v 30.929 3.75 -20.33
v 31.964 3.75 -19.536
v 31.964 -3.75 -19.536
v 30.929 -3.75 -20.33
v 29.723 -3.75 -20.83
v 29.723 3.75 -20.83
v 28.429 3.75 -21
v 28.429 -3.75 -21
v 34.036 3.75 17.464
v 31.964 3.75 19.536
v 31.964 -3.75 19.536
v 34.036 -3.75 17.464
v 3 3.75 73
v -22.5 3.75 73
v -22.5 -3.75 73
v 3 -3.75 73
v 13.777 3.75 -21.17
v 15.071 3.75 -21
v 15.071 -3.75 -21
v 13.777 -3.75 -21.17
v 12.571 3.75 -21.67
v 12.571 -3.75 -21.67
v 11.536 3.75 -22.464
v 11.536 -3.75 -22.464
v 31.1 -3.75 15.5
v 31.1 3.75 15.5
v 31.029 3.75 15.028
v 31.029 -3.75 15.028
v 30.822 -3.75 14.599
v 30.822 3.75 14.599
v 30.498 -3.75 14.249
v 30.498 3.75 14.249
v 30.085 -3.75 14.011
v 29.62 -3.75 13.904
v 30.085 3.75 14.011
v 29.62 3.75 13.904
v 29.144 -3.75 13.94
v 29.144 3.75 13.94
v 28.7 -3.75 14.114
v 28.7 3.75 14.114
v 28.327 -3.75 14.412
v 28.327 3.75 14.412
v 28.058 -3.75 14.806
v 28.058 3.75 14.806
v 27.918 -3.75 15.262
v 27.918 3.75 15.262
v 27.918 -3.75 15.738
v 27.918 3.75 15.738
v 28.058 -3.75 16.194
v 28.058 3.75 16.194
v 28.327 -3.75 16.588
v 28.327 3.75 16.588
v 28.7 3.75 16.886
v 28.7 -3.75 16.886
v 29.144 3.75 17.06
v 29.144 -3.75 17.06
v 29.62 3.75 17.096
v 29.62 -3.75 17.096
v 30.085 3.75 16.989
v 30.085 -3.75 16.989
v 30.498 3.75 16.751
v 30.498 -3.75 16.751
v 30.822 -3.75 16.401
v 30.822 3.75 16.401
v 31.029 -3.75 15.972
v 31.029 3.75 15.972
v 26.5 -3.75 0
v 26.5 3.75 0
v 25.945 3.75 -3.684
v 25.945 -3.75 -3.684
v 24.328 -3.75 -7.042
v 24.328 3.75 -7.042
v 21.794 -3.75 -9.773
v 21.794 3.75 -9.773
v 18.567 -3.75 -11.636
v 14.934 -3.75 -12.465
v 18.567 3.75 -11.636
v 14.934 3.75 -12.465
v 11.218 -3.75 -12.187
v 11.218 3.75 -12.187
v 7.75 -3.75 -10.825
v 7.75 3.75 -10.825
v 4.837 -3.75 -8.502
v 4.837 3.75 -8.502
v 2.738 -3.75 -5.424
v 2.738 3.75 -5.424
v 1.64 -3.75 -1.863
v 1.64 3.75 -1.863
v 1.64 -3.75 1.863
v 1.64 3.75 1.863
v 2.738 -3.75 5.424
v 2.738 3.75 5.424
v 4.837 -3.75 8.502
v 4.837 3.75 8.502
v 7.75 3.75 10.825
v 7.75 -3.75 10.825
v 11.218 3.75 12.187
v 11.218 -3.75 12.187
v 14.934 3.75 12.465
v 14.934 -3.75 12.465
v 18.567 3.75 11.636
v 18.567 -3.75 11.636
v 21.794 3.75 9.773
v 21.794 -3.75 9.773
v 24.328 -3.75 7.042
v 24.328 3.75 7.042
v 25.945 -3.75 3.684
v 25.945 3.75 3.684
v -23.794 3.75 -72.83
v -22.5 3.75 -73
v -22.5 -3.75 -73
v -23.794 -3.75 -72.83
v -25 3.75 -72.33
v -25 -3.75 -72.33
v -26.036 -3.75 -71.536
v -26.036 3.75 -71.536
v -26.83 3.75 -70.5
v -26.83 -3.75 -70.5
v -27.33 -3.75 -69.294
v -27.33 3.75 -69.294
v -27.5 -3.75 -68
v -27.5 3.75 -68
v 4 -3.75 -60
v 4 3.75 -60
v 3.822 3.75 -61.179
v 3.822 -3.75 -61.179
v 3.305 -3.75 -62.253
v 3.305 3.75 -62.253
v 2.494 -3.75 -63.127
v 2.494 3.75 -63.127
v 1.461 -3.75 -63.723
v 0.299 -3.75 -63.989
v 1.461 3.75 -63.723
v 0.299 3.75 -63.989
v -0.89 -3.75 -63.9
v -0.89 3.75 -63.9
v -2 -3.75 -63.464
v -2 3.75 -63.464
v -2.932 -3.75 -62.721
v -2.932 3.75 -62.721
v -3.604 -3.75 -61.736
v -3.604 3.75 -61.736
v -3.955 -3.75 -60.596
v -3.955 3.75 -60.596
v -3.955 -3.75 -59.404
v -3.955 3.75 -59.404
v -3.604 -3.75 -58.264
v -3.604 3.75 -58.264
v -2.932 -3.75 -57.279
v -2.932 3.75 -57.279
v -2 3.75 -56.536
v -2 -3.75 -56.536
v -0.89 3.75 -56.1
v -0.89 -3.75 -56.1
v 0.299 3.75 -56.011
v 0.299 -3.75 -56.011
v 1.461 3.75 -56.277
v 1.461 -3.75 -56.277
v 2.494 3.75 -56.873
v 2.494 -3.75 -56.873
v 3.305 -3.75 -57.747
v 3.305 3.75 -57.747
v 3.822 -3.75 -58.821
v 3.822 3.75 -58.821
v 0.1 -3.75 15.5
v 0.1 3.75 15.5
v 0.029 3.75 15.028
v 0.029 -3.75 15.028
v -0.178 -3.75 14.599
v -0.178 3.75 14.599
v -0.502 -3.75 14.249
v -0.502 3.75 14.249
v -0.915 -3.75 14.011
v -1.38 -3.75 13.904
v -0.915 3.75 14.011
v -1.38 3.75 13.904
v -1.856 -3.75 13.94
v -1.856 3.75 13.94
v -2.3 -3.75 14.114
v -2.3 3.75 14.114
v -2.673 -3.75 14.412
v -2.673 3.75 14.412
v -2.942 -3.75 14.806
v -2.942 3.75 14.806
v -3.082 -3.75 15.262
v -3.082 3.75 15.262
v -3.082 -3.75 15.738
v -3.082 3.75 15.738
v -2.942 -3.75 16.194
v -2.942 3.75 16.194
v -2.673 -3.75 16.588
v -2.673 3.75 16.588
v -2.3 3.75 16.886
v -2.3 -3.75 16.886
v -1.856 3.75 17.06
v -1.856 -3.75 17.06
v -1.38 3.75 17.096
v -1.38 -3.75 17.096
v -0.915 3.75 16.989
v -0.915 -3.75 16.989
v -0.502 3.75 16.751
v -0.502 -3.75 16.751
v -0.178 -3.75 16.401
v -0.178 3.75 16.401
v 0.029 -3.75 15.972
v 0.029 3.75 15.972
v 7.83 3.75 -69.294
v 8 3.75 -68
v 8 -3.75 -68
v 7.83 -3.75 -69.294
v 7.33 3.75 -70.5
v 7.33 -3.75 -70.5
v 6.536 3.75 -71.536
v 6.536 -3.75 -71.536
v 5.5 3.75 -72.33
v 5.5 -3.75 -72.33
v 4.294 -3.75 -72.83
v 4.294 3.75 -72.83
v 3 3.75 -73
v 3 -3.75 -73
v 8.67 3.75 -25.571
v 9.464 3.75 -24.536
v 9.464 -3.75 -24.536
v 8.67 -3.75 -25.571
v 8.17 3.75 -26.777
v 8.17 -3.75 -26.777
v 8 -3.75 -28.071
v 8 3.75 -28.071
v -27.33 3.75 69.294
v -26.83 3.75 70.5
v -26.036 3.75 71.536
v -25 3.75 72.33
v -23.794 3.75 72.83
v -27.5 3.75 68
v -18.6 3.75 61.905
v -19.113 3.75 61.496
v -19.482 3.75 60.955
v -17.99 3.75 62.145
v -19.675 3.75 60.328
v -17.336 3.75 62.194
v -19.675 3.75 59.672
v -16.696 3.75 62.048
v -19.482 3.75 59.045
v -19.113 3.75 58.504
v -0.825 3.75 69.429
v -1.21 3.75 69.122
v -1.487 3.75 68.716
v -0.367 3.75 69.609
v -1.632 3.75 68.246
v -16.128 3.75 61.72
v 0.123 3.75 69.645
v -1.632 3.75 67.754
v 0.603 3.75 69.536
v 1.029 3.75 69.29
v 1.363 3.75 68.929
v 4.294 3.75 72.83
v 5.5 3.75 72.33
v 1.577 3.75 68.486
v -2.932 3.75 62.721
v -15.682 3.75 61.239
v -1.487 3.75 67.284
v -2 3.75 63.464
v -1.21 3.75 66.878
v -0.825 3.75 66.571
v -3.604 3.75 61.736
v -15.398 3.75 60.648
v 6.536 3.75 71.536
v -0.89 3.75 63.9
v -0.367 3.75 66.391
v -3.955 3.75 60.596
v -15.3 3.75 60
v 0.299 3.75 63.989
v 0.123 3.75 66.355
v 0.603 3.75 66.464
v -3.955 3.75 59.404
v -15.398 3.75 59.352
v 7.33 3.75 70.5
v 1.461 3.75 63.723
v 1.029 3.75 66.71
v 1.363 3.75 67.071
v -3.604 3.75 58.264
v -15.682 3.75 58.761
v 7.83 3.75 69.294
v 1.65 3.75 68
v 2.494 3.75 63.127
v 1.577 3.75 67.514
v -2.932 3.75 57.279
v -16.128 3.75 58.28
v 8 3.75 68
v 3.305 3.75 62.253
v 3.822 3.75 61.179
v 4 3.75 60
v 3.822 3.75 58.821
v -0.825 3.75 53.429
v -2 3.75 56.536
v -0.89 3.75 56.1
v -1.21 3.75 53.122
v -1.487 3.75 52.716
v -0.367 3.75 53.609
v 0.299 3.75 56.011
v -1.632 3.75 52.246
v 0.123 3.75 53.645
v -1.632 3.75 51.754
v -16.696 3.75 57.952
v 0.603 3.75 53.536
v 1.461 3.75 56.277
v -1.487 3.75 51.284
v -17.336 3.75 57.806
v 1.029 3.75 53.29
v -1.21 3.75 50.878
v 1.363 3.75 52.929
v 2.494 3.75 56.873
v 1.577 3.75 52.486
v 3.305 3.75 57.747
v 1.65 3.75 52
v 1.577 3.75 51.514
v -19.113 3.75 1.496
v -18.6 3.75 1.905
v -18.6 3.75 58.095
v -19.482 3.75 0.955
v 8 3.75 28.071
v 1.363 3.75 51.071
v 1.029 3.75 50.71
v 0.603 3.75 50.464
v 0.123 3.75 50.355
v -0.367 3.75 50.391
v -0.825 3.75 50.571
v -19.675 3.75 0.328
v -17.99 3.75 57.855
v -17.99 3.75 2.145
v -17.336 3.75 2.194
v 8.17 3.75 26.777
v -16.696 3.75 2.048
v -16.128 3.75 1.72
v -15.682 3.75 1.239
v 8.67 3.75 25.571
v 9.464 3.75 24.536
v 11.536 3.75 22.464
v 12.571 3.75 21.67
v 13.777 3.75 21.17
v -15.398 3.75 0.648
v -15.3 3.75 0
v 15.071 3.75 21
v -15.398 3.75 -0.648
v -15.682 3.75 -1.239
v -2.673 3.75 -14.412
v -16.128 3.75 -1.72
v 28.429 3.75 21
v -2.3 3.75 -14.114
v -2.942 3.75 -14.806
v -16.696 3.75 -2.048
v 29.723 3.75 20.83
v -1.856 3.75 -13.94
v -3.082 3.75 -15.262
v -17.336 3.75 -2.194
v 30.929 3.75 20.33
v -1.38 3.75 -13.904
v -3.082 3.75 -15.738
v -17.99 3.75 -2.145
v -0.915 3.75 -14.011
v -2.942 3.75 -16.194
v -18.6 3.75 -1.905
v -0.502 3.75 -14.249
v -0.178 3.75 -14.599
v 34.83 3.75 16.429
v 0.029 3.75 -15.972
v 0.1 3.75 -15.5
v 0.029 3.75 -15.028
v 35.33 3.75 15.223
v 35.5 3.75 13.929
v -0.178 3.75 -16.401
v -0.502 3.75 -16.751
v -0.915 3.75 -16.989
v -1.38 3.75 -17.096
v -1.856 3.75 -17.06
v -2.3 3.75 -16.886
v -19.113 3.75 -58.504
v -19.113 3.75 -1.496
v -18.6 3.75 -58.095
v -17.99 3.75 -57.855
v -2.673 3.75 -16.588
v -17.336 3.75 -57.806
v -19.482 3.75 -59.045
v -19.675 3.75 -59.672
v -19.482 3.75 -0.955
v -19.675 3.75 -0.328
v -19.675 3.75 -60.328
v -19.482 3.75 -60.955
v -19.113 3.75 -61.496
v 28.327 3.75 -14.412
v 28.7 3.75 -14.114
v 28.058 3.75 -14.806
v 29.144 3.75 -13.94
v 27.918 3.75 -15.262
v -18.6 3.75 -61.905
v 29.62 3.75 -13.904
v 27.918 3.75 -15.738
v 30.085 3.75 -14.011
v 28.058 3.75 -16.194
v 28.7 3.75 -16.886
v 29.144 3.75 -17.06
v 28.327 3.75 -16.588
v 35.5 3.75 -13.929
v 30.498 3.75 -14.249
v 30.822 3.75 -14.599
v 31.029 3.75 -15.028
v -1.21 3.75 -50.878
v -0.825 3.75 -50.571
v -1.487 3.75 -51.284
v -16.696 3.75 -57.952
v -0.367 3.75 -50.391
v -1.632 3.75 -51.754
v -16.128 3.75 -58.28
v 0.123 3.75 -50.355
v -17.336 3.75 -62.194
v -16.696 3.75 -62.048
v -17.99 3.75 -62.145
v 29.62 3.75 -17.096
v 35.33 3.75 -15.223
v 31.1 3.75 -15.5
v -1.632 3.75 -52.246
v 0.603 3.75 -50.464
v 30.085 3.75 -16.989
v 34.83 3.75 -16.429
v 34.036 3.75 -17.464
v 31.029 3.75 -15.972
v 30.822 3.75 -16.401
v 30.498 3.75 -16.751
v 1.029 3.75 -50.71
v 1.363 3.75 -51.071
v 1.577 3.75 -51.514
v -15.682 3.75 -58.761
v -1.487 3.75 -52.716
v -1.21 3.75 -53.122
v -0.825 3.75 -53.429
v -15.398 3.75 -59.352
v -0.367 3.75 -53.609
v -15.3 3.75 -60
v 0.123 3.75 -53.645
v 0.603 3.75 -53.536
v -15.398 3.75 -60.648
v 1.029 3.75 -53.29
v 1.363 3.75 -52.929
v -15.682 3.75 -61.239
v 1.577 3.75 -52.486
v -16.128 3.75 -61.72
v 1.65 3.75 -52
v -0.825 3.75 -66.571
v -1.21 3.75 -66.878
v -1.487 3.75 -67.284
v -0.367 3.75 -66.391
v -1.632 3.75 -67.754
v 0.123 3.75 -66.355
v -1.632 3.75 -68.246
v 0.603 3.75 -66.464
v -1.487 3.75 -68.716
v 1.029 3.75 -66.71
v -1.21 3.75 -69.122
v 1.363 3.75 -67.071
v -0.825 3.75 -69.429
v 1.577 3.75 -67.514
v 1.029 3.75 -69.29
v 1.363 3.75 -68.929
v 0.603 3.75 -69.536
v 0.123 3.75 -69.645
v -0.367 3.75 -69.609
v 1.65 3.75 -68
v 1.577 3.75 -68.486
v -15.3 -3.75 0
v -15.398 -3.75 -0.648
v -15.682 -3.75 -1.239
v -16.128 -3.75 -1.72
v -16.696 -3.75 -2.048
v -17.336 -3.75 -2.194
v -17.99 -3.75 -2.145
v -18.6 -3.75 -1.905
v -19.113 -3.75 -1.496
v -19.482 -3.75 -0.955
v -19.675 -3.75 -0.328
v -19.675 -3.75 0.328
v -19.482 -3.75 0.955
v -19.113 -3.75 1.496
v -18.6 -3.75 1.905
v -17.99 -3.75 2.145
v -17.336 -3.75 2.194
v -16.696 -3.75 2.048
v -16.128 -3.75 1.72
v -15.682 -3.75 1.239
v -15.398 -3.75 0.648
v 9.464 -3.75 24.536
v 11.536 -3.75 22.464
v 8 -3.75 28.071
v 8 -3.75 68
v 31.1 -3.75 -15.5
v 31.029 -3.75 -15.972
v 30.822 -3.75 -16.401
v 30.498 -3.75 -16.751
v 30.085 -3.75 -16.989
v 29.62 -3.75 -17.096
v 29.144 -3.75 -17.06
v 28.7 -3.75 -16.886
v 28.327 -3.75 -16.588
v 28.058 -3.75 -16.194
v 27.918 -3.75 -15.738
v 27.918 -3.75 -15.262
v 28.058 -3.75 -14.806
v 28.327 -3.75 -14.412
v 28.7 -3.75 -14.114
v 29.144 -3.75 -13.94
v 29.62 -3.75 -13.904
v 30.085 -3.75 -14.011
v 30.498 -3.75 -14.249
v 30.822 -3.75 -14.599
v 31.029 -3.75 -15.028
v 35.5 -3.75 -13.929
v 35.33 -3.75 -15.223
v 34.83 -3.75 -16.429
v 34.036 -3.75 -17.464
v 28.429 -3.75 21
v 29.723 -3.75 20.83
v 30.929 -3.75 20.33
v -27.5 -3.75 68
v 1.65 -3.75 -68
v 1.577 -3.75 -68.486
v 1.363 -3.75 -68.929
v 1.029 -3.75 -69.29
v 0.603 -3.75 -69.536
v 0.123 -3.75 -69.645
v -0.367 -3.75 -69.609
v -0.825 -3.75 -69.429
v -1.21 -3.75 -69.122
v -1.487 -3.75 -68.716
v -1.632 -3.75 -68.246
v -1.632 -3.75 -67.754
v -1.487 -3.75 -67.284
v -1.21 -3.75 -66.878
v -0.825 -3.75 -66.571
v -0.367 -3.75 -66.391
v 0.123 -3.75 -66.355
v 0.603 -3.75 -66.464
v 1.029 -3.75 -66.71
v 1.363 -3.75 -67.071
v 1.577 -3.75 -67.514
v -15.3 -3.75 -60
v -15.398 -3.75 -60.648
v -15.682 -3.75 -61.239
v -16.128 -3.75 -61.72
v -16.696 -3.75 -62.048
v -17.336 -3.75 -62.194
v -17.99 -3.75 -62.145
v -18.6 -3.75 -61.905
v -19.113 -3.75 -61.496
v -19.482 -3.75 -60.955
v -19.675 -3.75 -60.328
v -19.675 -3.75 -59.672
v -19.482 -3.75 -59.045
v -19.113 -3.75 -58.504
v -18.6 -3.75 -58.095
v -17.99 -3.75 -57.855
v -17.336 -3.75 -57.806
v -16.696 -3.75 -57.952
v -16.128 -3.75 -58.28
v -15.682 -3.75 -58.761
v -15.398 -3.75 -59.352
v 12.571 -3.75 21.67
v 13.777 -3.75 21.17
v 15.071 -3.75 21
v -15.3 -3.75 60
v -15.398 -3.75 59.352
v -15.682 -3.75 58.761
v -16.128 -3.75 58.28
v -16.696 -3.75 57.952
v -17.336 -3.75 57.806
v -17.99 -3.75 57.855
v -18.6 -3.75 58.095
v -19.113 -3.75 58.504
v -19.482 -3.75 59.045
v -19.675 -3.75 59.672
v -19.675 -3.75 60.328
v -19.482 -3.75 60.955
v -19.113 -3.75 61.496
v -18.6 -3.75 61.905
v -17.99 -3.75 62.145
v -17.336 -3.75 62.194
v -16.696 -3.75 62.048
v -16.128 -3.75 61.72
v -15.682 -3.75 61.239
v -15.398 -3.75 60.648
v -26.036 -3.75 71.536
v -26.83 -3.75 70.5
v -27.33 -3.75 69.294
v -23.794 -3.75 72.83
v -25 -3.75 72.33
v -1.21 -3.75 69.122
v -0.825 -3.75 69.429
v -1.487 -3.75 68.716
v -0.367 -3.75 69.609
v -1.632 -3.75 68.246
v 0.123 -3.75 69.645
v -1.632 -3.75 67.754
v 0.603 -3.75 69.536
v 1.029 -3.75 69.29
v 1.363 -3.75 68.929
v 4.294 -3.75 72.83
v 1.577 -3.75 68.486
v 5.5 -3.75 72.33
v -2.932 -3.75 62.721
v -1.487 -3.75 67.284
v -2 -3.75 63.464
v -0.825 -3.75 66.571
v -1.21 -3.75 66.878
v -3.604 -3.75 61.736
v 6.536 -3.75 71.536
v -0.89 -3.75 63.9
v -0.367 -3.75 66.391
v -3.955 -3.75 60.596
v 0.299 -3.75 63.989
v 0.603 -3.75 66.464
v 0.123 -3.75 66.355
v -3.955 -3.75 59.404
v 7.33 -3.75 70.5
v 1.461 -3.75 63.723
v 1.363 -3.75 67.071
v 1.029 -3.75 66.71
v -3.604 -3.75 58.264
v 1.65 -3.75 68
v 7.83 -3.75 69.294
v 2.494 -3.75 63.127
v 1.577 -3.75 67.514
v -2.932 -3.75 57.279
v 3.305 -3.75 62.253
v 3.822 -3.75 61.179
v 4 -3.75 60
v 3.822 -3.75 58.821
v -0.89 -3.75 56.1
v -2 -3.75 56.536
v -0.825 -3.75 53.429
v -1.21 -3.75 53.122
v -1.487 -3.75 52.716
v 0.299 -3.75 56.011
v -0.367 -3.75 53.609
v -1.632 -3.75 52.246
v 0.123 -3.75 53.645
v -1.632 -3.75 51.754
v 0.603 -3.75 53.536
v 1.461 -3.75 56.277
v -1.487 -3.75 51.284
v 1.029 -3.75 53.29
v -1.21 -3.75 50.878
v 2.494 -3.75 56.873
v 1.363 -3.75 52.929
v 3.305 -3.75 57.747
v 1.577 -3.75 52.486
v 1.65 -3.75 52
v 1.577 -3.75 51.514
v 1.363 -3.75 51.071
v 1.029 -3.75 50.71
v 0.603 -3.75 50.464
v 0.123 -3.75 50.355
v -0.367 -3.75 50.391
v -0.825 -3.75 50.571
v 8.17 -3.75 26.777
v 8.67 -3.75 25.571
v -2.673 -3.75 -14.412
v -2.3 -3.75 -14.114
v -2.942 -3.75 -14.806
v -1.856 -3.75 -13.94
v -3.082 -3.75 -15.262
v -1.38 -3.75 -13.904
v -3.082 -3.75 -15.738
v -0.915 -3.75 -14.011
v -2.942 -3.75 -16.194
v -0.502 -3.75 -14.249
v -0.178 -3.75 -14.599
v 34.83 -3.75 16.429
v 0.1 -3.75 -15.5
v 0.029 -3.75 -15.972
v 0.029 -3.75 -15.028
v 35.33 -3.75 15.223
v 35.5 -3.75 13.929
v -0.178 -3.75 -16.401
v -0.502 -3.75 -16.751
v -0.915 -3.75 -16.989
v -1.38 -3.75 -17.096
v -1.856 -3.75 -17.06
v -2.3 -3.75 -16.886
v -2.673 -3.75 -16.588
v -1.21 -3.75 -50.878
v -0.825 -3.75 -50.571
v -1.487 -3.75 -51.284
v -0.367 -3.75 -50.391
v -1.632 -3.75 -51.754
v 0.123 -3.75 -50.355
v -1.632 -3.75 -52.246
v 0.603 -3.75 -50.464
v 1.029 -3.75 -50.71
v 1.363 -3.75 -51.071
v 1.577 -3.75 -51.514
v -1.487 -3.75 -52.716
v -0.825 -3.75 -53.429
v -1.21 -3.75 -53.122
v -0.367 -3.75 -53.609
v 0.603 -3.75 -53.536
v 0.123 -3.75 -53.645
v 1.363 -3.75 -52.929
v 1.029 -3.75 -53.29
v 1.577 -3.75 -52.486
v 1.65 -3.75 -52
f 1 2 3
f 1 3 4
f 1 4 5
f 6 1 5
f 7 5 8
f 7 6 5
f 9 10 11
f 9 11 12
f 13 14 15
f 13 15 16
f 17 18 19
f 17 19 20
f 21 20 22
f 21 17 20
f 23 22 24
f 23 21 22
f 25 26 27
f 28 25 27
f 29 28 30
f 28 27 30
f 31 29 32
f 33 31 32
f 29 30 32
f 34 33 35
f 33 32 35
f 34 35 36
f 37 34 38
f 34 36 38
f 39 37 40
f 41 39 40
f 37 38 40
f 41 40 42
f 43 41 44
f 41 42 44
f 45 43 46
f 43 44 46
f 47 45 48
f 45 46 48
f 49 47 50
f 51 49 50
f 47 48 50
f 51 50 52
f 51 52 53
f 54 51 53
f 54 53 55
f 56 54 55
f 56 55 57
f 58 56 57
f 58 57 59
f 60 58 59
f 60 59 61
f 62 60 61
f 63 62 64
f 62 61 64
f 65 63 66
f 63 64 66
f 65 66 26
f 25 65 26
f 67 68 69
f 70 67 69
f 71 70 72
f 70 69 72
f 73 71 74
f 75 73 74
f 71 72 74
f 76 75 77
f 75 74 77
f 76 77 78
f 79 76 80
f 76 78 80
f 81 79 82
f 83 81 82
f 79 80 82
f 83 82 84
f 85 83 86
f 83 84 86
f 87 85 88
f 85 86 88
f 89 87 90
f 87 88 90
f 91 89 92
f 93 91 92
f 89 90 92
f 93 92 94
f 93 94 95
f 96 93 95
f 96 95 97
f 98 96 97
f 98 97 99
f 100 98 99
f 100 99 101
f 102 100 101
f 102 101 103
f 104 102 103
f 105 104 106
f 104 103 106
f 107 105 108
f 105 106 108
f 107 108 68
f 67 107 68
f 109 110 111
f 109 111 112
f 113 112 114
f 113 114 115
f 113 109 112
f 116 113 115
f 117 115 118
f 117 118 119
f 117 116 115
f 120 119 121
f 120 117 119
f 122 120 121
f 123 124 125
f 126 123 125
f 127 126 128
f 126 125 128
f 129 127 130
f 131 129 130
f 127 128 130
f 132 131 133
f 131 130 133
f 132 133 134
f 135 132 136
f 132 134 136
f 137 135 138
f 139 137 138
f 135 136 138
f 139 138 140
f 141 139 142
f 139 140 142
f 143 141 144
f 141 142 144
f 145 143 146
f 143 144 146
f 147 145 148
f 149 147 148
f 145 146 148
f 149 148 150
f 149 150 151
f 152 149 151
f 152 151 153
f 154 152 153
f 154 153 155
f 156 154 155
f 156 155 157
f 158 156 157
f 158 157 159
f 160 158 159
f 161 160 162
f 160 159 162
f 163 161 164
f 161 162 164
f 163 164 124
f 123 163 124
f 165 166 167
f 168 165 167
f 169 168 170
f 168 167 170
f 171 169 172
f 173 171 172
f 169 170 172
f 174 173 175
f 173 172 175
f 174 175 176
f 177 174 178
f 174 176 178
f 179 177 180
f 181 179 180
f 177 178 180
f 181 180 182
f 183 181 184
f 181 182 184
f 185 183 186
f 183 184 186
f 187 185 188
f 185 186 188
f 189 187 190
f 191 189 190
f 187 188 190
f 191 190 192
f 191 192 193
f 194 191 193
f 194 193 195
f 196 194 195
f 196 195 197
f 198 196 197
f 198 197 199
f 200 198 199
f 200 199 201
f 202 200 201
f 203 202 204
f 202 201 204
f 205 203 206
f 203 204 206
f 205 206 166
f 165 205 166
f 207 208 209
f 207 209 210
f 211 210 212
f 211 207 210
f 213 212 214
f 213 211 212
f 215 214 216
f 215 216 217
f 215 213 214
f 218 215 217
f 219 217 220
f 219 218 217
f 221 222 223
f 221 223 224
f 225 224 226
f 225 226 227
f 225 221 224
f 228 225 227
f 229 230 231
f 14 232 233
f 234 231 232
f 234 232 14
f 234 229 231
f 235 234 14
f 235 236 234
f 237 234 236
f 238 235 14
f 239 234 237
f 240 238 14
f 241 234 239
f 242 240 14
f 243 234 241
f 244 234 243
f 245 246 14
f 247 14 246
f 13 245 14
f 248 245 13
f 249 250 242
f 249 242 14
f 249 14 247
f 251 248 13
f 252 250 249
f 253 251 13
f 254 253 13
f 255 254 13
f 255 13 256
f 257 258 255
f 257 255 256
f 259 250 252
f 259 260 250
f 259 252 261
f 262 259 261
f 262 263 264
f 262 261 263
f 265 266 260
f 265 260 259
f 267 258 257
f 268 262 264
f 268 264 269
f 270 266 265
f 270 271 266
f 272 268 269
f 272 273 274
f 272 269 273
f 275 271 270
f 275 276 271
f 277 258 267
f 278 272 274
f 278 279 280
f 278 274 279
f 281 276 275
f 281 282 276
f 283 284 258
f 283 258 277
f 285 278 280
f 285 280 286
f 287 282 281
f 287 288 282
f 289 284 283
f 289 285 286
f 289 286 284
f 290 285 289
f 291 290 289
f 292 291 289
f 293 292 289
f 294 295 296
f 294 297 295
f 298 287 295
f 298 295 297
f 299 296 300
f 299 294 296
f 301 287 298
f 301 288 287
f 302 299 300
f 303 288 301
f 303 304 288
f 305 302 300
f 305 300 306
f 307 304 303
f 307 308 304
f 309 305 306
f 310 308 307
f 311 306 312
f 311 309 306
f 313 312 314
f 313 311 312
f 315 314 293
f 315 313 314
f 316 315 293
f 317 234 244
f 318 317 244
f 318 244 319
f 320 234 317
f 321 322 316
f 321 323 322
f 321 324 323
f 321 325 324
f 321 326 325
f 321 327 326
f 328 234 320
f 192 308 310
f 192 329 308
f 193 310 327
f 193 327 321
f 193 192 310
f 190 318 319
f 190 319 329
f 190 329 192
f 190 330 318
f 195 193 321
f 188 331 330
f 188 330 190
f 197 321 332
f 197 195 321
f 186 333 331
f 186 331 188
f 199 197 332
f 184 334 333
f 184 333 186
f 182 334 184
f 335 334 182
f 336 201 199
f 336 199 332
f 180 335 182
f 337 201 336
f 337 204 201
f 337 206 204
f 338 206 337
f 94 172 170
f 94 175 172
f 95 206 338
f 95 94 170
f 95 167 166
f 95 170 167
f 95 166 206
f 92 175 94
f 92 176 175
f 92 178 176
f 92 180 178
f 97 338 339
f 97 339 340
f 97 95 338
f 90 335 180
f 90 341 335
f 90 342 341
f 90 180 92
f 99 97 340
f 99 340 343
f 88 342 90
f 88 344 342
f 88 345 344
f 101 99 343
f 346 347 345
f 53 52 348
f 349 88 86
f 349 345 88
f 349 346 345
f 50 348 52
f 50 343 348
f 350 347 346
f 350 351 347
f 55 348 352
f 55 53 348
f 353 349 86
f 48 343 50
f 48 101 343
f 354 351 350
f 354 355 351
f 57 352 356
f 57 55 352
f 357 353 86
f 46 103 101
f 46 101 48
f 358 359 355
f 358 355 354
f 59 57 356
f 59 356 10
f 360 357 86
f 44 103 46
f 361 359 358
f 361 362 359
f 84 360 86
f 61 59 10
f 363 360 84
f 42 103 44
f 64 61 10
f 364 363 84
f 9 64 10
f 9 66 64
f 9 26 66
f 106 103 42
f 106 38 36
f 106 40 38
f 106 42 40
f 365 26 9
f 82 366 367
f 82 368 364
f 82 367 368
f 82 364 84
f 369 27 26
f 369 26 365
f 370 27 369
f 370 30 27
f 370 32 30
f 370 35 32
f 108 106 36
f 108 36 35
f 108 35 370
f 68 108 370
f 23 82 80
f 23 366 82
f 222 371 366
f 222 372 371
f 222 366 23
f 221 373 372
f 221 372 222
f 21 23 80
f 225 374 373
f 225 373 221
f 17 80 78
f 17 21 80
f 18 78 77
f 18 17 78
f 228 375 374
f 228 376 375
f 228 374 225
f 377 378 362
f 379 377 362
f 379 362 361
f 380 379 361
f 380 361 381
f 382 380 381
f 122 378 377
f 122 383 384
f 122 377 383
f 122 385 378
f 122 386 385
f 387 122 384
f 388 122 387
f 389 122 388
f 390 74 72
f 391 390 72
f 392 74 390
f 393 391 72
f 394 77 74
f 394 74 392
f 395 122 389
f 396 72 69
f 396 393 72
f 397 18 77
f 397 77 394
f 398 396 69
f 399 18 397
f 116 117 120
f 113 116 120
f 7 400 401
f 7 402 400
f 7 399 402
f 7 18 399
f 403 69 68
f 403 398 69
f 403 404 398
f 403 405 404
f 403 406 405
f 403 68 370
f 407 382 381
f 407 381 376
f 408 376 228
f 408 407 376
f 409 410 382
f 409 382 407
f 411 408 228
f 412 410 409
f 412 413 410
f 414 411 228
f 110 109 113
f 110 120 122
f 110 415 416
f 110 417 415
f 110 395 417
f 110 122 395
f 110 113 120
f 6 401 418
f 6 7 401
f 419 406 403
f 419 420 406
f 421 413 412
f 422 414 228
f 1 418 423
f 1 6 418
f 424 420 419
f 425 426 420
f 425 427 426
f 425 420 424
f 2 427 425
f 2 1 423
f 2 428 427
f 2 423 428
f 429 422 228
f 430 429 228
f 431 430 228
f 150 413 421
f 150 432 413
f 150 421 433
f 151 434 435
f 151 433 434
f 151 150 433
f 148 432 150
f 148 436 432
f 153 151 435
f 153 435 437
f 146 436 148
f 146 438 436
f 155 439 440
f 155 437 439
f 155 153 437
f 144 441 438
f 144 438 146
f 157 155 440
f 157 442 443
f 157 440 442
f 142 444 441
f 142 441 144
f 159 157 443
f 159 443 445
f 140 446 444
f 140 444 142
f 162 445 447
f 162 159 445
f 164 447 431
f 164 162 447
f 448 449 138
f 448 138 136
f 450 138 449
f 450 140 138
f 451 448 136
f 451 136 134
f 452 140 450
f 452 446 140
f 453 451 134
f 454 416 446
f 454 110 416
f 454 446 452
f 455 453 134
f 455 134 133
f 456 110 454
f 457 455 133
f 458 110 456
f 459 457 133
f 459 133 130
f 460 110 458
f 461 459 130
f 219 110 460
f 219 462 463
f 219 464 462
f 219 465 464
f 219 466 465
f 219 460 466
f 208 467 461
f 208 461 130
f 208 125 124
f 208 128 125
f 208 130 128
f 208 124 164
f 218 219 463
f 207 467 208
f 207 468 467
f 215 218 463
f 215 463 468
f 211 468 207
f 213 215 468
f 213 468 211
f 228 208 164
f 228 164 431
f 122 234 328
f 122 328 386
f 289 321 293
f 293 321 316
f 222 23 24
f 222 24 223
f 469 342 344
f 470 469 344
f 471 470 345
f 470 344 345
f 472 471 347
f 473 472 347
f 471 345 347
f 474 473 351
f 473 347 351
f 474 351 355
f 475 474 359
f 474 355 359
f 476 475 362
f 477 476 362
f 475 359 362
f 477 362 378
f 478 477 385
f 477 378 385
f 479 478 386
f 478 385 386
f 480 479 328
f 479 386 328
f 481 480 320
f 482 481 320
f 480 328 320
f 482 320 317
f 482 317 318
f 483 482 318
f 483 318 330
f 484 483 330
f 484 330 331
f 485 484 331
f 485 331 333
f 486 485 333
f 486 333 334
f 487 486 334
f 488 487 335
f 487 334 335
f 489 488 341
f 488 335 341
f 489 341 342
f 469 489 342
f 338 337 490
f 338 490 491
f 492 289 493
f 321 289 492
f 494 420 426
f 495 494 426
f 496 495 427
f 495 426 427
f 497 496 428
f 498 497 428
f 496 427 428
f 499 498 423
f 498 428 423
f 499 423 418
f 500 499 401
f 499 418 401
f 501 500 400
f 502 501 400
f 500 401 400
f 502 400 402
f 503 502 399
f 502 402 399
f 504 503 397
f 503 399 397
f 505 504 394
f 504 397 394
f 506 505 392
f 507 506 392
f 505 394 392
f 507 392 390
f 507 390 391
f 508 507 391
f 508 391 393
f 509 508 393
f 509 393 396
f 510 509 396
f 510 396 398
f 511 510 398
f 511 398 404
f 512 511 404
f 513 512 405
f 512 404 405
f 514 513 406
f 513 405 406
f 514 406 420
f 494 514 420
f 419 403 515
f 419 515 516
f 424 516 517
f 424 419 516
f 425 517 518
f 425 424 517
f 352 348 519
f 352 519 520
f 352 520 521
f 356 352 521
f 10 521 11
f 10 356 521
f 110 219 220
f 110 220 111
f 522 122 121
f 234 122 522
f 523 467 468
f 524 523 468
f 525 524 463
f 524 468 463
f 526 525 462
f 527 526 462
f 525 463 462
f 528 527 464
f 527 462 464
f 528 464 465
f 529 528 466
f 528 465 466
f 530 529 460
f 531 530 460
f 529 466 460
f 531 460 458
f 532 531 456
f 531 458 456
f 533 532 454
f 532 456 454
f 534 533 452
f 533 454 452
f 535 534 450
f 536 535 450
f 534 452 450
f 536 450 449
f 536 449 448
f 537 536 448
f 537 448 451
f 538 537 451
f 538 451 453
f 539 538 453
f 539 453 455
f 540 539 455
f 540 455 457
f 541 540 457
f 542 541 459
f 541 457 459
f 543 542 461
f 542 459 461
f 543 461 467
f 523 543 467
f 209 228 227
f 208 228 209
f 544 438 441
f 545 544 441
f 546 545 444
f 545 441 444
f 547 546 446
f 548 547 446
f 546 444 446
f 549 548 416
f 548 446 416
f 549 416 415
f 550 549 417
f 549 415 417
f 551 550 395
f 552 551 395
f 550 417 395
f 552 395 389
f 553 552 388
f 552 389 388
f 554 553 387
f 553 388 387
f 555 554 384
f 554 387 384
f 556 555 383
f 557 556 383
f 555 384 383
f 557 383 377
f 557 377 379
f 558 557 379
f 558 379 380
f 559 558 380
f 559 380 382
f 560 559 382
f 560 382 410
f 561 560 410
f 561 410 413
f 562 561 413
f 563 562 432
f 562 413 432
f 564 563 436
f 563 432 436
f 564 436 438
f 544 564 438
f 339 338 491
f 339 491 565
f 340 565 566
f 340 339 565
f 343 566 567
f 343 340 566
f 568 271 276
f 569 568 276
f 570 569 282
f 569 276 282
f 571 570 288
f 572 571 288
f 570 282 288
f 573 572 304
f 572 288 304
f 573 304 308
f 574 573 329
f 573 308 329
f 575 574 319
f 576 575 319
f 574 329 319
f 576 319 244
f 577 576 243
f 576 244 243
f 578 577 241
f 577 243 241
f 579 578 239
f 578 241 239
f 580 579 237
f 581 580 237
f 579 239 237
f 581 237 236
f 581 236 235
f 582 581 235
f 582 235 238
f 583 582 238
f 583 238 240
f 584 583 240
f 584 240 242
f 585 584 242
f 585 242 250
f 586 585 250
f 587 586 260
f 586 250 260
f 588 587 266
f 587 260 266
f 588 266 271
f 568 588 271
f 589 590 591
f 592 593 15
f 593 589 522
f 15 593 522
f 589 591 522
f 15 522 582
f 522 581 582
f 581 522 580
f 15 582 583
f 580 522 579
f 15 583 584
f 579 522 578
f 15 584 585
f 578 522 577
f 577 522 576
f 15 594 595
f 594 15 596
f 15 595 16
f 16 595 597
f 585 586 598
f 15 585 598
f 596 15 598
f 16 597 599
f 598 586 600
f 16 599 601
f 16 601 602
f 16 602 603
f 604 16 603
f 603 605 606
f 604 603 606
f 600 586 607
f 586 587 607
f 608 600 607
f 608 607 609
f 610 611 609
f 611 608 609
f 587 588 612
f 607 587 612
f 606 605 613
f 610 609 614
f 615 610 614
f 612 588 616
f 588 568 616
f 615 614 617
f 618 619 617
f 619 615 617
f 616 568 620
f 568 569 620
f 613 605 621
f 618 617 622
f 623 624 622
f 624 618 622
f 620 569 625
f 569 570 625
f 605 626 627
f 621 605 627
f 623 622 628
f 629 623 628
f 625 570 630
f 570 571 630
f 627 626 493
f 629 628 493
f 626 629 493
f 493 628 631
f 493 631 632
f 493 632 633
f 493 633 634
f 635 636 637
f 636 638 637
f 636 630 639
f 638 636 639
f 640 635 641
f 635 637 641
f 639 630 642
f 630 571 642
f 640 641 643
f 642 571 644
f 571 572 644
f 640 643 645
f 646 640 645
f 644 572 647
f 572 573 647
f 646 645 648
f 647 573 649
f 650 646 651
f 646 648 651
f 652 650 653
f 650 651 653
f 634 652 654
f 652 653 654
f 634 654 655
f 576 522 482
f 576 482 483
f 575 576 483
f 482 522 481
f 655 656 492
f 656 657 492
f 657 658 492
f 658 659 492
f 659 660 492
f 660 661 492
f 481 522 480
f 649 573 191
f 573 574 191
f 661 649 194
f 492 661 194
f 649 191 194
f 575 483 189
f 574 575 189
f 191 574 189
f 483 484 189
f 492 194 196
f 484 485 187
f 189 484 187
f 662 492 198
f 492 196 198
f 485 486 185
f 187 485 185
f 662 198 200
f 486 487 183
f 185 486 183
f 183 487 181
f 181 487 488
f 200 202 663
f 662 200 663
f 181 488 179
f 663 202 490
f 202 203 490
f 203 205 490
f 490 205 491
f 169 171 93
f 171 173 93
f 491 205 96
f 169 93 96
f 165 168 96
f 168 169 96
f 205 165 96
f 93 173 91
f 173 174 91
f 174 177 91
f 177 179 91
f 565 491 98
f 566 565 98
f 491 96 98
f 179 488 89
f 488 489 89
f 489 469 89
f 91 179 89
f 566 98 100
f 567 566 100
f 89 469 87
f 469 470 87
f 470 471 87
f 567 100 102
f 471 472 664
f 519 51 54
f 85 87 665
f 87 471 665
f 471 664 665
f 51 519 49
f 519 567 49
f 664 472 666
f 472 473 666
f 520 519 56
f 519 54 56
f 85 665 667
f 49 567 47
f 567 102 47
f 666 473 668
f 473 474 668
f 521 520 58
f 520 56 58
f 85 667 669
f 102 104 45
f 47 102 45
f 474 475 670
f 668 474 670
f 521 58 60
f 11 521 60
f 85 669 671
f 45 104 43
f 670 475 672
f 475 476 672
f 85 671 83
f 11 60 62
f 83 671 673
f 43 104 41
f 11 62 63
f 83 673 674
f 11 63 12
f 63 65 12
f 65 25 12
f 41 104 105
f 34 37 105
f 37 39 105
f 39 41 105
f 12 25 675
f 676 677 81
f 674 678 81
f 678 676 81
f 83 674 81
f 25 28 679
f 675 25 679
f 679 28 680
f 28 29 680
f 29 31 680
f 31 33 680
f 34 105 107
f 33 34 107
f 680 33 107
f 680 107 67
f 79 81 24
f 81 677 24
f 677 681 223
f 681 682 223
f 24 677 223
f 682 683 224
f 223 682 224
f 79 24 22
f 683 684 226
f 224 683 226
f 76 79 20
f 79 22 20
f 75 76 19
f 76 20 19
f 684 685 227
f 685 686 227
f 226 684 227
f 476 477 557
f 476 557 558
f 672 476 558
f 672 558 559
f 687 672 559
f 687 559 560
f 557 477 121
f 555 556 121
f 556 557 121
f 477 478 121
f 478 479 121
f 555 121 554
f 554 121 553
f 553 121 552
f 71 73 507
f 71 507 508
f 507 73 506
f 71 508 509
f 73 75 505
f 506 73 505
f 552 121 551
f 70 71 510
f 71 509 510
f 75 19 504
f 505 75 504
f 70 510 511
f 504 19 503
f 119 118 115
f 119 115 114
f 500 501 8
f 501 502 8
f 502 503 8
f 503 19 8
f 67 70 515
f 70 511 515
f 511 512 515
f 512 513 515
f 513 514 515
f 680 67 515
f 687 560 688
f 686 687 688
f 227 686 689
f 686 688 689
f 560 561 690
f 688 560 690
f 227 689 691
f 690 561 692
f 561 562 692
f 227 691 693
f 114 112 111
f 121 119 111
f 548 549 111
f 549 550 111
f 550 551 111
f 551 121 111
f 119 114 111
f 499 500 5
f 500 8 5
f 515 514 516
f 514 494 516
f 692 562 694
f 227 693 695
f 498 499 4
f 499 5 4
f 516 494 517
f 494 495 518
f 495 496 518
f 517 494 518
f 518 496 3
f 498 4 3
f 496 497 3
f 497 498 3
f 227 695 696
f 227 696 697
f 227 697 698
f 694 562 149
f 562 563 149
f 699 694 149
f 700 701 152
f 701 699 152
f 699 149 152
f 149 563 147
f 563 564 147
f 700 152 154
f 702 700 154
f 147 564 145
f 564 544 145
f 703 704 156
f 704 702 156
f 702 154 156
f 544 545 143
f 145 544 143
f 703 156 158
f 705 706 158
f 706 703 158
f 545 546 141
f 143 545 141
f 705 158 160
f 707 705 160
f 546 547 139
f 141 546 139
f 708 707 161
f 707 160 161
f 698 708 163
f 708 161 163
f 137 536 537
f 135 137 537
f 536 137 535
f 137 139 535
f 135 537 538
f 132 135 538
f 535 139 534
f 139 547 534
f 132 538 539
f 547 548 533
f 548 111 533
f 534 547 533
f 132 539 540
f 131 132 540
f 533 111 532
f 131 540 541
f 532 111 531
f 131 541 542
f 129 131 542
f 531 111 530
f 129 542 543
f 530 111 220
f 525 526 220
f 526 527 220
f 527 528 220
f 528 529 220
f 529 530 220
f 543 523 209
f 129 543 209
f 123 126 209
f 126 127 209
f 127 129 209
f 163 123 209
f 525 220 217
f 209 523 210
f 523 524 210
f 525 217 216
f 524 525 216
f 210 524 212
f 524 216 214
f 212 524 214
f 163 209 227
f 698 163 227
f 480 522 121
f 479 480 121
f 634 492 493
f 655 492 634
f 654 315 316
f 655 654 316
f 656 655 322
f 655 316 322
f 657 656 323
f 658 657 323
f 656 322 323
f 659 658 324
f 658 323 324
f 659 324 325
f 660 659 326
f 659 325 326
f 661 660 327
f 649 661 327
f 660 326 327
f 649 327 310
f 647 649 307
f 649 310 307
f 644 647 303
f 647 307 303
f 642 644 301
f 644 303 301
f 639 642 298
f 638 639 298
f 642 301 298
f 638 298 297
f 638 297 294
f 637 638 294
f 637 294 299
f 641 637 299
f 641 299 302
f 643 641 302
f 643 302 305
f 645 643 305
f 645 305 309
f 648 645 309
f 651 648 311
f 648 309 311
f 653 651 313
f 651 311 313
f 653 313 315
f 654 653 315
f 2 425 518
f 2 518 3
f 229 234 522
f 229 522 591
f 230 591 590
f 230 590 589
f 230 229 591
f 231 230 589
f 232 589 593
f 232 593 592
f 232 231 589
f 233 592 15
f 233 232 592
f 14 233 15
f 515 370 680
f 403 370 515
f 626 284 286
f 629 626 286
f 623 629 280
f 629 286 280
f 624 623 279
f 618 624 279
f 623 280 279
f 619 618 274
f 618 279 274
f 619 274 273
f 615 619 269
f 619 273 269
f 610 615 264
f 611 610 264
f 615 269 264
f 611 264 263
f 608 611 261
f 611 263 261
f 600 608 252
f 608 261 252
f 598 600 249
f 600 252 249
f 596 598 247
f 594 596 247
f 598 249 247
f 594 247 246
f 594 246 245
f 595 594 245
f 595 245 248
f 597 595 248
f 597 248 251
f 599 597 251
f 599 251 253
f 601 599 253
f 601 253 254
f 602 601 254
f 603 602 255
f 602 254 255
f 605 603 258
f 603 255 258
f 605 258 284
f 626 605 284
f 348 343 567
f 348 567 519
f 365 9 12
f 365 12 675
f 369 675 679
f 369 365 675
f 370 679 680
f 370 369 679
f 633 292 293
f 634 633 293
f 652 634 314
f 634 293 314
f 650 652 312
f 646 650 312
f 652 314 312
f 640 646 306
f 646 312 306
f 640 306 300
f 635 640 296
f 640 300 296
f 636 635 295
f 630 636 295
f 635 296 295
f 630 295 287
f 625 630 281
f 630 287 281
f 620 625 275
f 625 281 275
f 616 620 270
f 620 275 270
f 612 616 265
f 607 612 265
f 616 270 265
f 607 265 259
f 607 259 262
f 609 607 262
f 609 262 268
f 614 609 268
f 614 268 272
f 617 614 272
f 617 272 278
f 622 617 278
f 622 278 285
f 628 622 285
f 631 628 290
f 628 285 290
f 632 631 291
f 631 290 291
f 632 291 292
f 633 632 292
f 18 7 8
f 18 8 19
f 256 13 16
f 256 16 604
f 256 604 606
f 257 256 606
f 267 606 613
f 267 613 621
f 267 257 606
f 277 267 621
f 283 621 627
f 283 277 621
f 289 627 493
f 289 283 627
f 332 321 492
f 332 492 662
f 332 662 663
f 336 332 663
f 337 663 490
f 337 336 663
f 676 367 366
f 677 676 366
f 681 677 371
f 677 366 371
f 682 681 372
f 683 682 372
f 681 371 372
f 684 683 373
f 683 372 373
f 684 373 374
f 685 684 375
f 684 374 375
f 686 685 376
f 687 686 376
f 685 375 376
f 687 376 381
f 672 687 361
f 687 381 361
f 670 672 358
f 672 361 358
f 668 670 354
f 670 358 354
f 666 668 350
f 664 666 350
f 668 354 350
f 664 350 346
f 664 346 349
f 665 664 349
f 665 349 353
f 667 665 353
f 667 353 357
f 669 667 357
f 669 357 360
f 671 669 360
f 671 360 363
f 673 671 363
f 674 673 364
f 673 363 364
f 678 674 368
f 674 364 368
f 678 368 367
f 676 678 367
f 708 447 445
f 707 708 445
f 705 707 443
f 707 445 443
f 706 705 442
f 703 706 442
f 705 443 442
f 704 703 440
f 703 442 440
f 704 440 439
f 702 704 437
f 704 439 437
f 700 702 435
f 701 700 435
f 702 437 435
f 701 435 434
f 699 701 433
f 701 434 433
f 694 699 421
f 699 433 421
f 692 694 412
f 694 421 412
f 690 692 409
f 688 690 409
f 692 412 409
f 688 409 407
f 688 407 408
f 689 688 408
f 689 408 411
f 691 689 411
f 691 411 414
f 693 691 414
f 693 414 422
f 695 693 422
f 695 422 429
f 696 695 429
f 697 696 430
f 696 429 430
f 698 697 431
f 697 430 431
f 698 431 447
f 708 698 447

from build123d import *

# Parameters (mm, degrees)
SKETCH1_R           = 1.65
SKETCH1_R_2         = 1.6
SKETCH1_R_3         = 12.5
SKETCH1_R_4         = 2.2
SKETCH1_R_5         = 4
BOSS_EXTRUDE1_DEPTH = 7.5


with BuildPart() as part:
    # Sketch1 → Boss-Extrude1 (new body)
    with BuildSketch(Plane(origin=(0, 3.75, 0), x_dir=(1, 0, 0), z_dir=(0, 1, 0))):
        with BuildLine():
            Line((34.035533906, 17.464466094), (31.964466094, 19.535533906))
            ThreePointArc((31.964466094, 19.535533906), (30.34234935, 20.619397663), (28.428932188, 21))
            Line((28.428932188, 21), (15.071067812, 21))
            ThreePointArc((15.071067812, 21), (13.15765065, 21.380602337), (11.535533906, 22.464466094))
            Line((11.535533906, 22.464466094), (9.464466094, 24.535533906))
            ThreePointArc((9.464466094, 24.535533906), (8.380602337, 26.15765065), (8, 28.071067812))
            Line((8, 28.071067812), (8, 68))
            ThreePointArc((8, 68), (6.535533906, 71.535533906), (3, 73))
            Line((3, 73), (-22.5, 73))
            ThreePointArc((-22.5, 73), (-26.035533906, 71.535533906), (-27.5, 68))
            Line((-27.5, 68), (-27.5, -68))
            ThreePointArc((-27.5, -68), (-26.035533906, -71.535533906), (-22.5, -73))
            Line((-22.5, -73), (3, -73))
            ThreePointArc((3, -73), (6.535533906, -71.535533906), (8, -68))
            Line((8, -68), (8, -28.071067812))
            ThreePointArc((8, -28.071067812), (8.380602337, -26.15765065), (9.464466094, -24.535533906))
            Line((9.464466094, -24.535533906), (11.535533906, -22.464466094))
            ThreePointArc((11.535533906, -22.464466094), (13.15765065, -21.380602337), (15.071067812, -21))
            Line((15.071067812, -21), (28.428932188, -21))
            ThreePointArc((28.428932188, -21), (30.34234935, -20.619397663), (31.964466094, -19.535533906))
            Line((31.964466094, -19.535533906), (34.035533906, -17.464466094))
            ThreePointArc((34.035533906, -17.464466094), (35.119397663, -15.84234935), (35.5, -13.928932188))
            Line((35.5, -13.928932188), (35.5, 13.928932188))
            ThreePointArc((35.5, 13.928932188), (35.119397663, 15.84234935), (34.035533906, 17.464466094))
        make_face()
        with Locations((0, -68)):
            Circle(SKETCH1_R, mode=Mode.SUBTRACT)
        with Locations((0, -52)):
            Circle(SKETCH1_R, mode=Mode.SUBTRACT)
        with Locations((0, 68)):
            Circle(SKETCH1_R, mode=Mode.SUBTRACT)
        with Locations((0, 52)):
            Circle(SKETCH1_R, mode=Mode.SUBTRACT)
        with Locations((29.5, 15.5)):
            Circle(SKETCH1_R_2, mode=Mode.SUBTRACT)
        with Locations((-1.5, 15.5)):
            Circle(SKETCH1_R_2, mode=Mode.SUBTRACT)
        with Locations((-1.5, -15.5)):
            Circle(SKETCH1_R_2, mode=Mode.SUBTRACT)
        with Locations((29.5, -15.5)):
            Circle(SKETCH1_R_2, mode=Mode.SUBTRACT)
        with Locations((14, 0)):
            Circle(SKETCH1_R_3, mode=Mode.SUBTRACT)
        with Locations((-17.5, 0)):
            Circle(SKETCH1_R_4, mode=Mode.SUBTRACT)
        with Locations((0, -60)):
            Circle(SKETCH1_R_5, mode=Mode.SUBTRACT)
        with Locations((0, 60)):
            Circle(SKETCH1_R_5, mode=Mode.SUBTRACT)
        with Locations((-17.5, 60)):
            Circle(SKETCH1_R_4, mode=Mode.SUBTRACT)
        with Locations((-17.5, -60)):
            Circle(SKETCH1_R_4, mode=Mode.SUBTRACT)
    extrude(amount=-BOSS_EXTRUDE1_DEPTH)


solid = part.part
